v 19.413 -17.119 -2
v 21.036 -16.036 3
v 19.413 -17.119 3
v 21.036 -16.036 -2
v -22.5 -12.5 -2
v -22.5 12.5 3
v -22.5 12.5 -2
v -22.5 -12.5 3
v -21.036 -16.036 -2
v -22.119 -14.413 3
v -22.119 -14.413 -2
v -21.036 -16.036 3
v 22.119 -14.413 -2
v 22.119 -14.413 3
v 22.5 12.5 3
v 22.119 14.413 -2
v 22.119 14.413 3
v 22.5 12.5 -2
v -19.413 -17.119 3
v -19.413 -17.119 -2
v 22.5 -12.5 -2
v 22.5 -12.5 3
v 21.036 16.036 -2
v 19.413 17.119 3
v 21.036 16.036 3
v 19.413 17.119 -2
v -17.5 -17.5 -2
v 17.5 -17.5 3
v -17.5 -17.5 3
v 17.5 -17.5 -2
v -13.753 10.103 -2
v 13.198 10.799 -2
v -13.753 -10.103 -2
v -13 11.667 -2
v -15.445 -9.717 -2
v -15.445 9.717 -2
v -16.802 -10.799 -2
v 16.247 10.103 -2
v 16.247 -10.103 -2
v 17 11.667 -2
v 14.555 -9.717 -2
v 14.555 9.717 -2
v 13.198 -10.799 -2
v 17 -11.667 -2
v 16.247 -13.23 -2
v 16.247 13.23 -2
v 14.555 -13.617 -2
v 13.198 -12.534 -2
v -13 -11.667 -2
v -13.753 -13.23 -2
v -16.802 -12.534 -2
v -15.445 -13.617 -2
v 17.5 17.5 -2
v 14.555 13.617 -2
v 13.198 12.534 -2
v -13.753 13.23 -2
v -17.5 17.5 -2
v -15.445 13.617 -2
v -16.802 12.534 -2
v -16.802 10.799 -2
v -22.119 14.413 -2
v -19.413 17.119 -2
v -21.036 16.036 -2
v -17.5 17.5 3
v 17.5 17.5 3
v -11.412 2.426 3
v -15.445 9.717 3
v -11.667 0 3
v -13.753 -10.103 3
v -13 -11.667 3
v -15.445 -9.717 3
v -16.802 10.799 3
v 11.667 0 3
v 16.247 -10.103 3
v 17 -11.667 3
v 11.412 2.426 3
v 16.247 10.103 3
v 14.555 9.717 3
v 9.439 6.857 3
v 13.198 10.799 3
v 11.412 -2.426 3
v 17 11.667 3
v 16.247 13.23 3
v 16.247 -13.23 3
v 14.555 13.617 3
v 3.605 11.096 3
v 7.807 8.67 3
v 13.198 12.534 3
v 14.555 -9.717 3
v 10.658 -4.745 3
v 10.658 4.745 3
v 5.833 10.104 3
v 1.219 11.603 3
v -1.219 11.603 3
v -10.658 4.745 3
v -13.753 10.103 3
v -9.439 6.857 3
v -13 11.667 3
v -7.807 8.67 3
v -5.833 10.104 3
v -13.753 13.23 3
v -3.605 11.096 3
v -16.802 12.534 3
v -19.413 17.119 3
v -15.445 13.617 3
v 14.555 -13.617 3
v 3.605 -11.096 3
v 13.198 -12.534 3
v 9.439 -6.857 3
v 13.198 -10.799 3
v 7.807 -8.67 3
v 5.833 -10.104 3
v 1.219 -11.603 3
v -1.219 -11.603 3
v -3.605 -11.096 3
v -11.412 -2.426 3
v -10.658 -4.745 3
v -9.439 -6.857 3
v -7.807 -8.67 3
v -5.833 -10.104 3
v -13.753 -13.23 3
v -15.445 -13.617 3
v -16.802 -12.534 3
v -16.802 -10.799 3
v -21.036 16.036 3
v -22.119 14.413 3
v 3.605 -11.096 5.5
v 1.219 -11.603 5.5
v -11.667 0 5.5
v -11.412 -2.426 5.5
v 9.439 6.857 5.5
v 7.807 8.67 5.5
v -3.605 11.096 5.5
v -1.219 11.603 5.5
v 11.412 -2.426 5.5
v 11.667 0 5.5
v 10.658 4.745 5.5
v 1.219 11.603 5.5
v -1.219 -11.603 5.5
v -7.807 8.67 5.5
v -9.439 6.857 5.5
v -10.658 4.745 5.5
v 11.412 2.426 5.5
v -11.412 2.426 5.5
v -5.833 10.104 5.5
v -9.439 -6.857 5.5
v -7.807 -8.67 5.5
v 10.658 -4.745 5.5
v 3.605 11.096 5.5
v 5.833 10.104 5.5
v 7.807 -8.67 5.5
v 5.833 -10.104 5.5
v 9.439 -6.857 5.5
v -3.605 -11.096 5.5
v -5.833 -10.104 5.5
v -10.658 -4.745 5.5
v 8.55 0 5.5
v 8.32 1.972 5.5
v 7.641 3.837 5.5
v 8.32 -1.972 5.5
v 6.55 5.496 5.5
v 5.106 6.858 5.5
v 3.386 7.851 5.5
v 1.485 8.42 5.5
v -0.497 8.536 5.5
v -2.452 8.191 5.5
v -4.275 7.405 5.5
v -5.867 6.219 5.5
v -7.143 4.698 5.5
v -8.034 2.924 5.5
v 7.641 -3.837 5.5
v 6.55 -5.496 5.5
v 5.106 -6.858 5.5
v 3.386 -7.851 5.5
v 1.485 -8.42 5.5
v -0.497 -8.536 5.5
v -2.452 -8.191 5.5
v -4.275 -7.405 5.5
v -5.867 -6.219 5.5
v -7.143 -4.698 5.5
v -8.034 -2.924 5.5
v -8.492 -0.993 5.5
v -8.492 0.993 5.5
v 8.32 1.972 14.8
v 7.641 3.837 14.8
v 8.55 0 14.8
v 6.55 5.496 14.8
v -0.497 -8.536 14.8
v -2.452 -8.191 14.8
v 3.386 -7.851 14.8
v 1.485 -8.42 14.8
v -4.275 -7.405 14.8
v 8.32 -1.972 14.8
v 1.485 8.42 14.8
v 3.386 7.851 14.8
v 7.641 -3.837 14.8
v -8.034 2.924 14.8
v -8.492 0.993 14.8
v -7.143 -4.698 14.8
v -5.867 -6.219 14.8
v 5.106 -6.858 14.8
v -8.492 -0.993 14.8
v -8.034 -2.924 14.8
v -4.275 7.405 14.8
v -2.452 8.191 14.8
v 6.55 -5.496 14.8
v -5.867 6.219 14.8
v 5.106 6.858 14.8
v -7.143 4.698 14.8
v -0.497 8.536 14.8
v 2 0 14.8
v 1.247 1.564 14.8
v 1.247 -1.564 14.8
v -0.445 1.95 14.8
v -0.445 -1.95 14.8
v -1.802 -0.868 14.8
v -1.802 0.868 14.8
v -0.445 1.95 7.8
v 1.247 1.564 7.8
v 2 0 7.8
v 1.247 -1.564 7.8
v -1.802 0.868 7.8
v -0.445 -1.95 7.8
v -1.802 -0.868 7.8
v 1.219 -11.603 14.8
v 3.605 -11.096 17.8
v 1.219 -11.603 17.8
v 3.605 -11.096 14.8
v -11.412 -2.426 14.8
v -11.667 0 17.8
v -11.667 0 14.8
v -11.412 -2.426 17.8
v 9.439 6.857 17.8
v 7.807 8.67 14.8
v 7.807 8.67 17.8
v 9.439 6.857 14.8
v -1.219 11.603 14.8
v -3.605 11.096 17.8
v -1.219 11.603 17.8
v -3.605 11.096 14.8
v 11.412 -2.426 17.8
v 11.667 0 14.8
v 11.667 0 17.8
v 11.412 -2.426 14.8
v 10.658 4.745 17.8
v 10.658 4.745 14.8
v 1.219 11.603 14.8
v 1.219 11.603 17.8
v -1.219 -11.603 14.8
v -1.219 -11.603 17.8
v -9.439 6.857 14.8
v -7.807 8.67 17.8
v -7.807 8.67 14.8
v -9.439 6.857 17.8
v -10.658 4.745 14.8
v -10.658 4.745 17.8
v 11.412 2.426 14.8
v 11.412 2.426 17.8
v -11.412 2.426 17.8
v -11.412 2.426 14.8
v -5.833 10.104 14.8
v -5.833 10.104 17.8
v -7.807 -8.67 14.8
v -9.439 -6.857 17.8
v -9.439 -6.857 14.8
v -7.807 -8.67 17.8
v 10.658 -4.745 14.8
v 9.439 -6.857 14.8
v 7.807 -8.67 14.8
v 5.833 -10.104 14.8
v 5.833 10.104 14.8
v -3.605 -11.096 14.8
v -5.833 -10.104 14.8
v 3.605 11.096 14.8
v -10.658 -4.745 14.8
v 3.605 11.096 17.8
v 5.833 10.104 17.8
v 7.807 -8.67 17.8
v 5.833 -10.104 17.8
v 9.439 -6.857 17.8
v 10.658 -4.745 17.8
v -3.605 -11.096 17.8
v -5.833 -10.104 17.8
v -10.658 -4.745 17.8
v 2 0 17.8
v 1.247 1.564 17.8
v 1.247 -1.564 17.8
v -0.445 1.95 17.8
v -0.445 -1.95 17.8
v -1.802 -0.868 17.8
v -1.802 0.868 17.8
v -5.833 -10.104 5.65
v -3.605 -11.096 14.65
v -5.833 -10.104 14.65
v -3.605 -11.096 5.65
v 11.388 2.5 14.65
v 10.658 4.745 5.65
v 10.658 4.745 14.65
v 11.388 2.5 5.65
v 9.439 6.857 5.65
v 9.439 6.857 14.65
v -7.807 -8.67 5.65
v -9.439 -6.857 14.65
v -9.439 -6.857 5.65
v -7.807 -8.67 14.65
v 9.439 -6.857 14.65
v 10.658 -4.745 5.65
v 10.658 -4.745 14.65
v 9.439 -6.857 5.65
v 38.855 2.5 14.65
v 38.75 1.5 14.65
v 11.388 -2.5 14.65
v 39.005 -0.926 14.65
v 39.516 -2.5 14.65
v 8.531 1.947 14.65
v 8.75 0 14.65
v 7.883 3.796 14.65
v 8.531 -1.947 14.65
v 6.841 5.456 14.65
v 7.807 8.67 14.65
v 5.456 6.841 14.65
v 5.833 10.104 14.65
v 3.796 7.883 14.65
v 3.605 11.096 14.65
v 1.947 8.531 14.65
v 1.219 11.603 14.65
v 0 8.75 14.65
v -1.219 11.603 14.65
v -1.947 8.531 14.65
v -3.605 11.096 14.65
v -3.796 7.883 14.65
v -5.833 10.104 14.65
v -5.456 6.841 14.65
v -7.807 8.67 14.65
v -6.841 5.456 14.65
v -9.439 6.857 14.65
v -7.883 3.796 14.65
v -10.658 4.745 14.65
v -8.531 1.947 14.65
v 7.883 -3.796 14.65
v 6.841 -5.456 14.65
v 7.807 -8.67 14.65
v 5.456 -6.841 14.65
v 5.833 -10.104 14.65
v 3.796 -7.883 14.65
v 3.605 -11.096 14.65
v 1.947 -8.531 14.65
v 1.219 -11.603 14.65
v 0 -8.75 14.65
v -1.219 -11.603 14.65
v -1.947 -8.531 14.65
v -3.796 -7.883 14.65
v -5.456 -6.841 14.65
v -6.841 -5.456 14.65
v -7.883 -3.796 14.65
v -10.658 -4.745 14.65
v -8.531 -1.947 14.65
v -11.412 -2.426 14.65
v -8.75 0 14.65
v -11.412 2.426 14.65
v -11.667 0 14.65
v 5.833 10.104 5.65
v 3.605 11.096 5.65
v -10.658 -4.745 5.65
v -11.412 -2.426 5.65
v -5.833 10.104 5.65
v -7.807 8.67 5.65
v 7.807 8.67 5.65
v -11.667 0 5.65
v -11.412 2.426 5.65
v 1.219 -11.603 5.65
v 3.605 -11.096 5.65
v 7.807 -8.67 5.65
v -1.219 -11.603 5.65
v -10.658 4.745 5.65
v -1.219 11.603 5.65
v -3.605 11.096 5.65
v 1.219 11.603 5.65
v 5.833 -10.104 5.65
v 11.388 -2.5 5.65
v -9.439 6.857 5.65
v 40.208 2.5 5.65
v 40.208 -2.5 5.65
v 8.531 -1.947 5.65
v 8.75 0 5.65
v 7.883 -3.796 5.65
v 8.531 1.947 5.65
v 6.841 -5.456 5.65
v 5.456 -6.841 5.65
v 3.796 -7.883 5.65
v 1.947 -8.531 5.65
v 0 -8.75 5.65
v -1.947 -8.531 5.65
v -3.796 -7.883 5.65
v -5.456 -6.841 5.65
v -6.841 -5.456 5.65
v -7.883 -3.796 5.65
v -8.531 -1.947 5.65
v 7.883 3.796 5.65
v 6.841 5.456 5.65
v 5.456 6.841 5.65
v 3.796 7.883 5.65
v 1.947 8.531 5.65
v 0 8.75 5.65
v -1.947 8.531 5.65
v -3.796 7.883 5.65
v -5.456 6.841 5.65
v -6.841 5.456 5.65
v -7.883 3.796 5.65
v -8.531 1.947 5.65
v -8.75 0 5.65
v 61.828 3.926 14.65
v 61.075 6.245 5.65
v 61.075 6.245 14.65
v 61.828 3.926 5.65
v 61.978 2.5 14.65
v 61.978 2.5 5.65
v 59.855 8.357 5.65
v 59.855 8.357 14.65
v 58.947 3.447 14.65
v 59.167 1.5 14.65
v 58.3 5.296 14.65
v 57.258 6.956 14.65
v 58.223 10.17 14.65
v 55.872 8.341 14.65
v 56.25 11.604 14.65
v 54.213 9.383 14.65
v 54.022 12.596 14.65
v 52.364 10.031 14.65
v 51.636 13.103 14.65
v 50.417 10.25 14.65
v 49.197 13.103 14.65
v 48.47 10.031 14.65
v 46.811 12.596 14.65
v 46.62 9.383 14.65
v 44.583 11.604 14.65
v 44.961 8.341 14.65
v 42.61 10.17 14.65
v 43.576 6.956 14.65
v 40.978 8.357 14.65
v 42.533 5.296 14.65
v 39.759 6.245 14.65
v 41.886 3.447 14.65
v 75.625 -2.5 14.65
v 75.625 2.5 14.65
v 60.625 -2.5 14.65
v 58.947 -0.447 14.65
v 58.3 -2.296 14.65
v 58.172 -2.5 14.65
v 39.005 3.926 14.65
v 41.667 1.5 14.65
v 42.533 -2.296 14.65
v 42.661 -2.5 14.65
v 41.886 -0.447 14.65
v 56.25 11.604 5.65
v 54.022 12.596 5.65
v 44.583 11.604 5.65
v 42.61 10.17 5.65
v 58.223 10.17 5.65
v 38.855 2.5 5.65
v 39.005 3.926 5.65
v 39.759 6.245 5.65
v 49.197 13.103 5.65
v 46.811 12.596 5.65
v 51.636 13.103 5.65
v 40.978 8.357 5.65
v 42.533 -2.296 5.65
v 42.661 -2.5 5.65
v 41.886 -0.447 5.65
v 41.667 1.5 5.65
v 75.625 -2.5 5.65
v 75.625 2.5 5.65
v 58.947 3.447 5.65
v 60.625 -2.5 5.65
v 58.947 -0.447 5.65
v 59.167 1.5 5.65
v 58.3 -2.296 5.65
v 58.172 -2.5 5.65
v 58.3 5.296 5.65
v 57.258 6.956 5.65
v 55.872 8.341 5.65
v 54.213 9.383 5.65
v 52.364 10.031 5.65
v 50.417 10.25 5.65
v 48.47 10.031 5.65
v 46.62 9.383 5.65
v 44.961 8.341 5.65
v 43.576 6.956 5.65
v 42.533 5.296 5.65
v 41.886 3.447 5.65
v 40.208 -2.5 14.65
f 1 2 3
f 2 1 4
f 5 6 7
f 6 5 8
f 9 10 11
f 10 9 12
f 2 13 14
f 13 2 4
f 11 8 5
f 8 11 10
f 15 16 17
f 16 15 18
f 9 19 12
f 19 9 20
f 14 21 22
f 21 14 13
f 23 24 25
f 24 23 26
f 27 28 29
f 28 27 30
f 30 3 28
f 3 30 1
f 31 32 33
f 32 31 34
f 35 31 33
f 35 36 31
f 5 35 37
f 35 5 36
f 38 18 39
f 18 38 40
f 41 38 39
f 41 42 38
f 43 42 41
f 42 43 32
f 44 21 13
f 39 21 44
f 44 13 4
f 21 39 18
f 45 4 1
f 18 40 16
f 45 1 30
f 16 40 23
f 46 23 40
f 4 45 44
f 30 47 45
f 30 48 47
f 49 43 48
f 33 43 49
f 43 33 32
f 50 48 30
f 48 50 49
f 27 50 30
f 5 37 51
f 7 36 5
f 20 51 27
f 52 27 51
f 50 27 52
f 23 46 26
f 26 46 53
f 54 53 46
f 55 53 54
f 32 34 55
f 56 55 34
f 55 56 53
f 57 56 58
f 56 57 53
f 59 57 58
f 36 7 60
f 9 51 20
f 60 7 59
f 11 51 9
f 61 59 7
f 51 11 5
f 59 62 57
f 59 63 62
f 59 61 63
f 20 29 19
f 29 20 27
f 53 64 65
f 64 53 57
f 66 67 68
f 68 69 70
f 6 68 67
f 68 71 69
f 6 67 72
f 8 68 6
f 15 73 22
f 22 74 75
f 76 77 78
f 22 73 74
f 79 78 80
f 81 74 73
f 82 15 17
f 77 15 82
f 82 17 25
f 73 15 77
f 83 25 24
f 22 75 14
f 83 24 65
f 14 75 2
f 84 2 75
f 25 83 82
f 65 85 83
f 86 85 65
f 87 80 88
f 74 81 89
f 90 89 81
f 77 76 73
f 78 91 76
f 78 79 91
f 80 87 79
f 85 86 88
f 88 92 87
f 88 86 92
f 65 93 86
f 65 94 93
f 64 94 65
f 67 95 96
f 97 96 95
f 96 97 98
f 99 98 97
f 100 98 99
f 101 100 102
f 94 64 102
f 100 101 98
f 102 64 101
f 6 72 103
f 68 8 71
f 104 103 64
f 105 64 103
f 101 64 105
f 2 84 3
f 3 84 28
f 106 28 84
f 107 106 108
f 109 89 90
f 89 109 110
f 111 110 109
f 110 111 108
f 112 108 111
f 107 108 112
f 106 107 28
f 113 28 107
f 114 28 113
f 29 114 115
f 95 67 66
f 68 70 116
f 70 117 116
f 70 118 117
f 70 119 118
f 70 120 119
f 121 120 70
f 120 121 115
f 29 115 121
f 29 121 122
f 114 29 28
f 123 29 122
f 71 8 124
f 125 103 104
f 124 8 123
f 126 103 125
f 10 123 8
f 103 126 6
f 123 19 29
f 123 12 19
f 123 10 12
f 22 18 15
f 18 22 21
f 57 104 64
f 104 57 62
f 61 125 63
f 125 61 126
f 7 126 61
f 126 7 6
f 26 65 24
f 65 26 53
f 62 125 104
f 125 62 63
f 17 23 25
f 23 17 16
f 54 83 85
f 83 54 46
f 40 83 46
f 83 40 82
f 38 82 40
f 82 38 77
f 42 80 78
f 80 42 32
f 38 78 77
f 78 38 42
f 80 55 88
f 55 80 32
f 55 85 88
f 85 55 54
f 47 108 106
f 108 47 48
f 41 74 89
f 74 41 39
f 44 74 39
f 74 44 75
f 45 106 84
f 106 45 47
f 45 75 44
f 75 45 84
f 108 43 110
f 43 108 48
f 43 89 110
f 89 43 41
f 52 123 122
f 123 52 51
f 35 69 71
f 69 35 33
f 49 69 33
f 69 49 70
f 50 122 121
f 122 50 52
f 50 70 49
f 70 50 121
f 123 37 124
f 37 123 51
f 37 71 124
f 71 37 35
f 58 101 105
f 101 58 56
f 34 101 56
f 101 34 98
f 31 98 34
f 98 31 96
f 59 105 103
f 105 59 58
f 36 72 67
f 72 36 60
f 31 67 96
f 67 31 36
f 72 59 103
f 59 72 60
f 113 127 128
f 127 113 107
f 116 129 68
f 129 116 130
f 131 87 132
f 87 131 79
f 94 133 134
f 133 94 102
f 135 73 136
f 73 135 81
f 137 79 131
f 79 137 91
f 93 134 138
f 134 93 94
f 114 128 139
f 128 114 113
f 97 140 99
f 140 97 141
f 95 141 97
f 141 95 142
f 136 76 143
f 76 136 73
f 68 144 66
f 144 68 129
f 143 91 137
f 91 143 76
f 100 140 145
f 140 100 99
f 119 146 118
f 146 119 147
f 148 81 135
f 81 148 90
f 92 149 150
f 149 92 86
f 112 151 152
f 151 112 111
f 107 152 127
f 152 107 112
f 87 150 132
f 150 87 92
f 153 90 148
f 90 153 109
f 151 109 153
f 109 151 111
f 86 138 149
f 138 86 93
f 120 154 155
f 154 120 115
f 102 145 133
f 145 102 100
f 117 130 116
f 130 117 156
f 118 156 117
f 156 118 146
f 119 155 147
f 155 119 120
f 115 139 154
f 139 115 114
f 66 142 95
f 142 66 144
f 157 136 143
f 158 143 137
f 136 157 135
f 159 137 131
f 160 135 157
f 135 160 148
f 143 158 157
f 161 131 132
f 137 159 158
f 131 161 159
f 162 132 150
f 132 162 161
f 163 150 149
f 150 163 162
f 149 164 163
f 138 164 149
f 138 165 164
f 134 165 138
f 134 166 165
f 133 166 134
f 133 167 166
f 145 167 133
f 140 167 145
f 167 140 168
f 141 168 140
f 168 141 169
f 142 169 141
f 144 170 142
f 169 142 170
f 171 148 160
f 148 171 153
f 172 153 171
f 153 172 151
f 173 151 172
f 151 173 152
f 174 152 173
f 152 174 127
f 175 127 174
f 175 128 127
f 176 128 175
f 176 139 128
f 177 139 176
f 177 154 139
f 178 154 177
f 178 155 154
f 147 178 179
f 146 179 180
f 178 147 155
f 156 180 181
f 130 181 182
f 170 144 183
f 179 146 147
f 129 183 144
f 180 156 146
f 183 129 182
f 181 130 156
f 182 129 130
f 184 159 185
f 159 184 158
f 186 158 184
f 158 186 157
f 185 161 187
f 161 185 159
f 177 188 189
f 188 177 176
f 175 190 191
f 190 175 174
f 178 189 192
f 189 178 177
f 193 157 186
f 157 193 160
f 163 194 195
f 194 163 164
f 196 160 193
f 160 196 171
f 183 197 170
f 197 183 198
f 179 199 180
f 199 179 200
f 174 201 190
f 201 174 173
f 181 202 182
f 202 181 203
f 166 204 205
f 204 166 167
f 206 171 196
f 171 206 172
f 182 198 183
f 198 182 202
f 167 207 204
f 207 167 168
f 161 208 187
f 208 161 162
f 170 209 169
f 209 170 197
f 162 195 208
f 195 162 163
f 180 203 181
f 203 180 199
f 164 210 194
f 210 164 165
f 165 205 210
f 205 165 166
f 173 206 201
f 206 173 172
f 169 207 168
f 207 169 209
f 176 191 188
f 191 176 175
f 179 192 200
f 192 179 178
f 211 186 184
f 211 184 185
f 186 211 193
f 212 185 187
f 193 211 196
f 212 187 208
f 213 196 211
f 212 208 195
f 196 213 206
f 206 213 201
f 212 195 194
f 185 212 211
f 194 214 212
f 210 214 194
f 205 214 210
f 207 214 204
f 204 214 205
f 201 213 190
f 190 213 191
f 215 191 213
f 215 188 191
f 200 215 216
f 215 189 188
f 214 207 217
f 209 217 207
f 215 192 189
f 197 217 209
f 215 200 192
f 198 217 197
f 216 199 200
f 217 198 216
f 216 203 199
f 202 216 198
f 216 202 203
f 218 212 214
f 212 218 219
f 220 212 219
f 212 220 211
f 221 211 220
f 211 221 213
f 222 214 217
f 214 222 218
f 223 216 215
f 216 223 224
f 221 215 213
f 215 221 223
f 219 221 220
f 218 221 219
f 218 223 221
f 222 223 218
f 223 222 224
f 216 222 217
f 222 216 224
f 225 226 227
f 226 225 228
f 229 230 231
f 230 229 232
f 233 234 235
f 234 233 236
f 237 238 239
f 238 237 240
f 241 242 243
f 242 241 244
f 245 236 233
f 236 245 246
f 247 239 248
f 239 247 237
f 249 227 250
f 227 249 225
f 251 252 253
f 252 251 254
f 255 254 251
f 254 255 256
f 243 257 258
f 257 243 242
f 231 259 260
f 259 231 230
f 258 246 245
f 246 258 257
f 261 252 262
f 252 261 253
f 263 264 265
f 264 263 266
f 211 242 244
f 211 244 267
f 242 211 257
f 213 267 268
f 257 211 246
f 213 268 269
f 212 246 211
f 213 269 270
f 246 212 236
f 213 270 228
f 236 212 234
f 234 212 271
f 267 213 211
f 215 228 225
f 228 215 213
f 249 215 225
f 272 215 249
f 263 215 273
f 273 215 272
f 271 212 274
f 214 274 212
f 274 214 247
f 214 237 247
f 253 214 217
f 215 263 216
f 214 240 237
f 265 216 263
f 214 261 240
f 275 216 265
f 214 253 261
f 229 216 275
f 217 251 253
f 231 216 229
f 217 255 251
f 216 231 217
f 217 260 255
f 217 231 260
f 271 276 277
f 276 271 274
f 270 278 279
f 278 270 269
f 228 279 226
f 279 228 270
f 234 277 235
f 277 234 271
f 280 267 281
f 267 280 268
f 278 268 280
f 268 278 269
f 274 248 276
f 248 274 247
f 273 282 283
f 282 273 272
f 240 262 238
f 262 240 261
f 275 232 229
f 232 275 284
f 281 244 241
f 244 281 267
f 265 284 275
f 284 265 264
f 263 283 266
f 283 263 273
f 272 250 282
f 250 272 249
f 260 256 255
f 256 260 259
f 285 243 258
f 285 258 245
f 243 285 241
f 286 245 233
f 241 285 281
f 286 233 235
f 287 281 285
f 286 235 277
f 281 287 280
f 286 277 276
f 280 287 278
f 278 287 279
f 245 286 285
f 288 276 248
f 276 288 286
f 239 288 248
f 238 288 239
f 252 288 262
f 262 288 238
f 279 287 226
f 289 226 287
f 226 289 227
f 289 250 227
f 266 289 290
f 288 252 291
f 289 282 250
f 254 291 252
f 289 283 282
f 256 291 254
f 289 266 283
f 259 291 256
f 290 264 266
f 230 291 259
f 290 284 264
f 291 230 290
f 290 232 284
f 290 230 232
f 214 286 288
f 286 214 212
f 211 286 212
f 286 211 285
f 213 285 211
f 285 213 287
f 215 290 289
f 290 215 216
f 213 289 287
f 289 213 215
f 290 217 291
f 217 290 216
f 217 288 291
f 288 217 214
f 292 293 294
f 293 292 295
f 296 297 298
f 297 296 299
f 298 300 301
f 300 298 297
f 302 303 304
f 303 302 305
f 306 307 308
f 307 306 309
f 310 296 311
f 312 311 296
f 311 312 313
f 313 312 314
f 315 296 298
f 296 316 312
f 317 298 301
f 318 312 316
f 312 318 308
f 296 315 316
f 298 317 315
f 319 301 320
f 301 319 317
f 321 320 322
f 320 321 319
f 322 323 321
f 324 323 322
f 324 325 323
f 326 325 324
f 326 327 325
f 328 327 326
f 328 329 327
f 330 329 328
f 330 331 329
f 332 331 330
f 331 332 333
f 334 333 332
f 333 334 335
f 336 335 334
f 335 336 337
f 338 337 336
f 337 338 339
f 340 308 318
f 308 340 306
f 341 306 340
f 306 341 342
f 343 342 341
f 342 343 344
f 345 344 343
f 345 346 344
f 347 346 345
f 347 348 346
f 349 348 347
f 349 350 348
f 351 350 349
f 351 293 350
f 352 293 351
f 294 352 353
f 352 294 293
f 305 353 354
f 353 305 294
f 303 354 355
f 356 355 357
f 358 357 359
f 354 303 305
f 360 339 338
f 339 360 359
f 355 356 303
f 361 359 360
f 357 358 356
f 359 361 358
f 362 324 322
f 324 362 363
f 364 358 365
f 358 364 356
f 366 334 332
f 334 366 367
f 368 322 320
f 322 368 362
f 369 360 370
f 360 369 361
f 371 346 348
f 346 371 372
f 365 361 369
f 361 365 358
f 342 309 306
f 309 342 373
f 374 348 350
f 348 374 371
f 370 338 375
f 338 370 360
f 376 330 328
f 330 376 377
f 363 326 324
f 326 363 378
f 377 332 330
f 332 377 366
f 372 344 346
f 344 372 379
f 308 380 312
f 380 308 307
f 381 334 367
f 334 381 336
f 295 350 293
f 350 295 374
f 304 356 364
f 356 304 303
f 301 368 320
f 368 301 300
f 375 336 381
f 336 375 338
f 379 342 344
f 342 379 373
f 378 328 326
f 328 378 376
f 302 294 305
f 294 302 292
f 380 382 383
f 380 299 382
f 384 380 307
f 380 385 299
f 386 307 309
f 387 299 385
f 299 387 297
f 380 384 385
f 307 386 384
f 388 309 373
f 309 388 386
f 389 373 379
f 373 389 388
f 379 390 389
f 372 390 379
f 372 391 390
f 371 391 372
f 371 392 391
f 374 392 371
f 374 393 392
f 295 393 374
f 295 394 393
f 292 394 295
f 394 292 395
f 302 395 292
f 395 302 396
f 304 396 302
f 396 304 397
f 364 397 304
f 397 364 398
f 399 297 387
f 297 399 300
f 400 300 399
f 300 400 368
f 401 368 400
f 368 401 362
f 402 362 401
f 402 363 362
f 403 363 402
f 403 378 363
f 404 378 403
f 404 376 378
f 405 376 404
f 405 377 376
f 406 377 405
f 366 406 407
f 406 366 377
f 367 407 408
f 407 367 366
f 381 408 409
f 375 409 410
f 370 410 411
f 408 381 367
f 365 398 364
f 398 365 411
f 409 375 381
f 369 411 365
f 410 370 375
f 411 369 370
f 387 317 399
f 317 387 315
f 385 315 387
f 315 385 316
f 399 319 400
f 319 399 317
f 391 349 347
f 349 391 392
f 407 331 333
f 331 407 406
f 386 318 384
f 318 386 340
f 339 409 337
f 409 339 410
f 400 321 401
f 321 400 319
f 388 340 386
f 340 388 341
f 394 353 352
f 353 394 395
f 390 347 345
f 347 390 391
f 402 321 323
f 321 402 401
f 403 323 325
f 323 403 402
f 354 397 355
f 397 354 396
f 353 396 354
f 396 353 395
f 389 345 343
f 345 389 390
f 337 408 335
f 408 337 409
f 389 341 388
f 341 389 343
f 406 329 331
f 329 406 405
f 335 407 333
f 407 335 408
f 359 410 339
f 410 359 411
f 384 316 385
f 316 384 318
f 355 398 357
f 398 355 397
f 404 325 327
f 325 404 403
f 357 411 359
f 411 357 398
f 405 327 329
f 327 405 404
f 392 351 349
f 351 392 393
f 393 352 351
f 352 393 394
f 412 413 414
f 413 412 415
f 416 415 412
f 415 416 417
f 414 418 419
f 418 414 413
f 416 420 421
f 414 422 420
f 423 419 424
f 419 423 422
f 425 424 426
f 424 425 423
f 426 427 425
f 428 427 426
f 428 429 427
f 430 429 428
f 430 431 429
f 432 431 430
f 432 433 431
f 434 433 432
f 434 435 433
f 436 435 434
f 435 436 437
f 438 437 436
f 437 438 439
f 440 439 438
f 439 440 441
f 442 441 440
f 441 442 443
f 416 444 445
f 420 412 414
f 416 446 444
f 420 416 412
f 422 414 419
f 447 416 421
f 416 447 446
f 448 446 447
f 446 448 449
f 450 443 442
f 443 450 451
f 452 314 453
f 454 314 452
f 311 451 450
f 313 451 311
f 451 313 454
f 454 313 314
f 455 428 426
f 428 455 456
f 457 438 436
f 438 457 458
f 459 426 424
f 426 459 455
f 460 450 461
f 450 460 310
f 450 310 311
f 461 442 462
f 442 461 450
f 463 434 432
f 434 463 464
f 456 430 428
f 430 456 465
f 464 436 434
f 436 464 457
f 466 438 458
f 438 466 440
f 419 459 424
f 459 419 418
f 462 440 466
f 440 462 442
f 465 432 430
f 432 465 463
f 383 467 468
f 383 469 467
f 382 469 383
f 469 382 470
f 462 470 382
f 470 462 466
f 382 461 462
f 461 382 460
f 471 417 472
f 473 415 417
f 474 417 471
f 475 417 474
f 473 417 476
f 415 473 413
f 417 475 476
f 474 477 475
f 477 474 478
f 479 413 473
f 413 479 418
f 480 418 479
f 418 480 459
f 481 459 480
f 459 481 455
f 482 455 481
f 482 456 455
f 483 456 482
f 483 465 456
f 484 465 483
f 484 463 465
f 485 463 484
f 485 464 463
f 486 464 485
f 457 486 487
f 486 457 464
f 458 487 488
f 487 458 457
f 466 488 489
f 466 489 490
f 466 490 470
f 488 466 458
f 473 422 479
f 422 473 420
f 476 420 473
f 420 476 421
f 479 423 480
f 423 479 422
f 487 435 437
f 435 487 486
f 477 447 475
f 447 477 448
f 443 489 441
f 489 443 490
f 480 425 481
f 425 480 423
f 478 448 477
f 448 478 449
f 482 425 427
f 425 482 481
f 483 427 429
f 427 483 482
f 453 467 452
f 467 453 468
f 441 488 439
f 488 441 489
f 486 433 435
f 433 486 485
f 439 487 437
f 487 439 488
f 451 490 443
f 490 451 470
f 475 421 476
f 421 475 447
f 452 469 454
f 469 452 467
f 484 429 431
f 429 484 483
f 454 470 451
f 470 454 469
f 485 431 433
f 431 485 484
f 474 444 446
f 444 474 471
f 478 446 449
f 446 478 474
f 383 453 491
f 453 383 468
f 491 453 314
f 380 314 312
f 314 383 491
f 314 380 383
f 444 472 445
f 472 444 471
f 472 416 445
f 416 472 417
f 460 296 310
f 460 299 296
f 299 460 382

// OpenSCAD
// Which one would you like to see?
part = "all"; // [first:Base Only,second:Top Only,third:Hook only,all:All]

/* [Base Settings] */
BaseHeight=5;
BaseLength=45;
BaseWidth=35;
//This one applies also to the hole to set the top on to the base.
MountingHoles=4;
/* [Pillar Settings] */
CylHeight=15;
Spacing=.3;
/* [Hook Settings] */
HookLength=30;
TabLength=15;
/* [Hidden] */
TabWidth=5;
print_part();

module print_part(){
    if(part=="first"){
        Base(BaseHeight,BaseLength,BaseWidth,MountingHoles,CylHeight);
    }
    else if(part=="second"){
        translate([0,0,BaseHeight/2+Spacing+CylHeight-CylHeight/5]) Top(BaseHeight,MountingHoles);
    }
    else if(part=="third"){
        translate([0,0,CylHeight/5]) Hook(HookLength,BaseHeight,BaseWidth,TabLength,CylHeight,Spacing);
    }
    else if(part=="all"){
        Base(BaseHeight,BaseLength,BaseWidth,MountingHoles,CylHeight);
translate([0,0,BaseHeight/2+Spacing+CylHeight-CylHeight/5]) Top(BaseHeight,MountingHoles);
translate([0,0,CylHeight/5]) Hook(HookLength,BaseHeight,BaseWidth,TabLength,CylHeight,Spacing);
    }
}

module Base(BaseHeight,BaseLength,BaseWidth,MountingHole,CylHeight){
    union(){difference(){
        minkowski(){
            cube([BaseLength-10,BaseWidth-10,BaseHeight-1],center=true);
            cylinder(r=5,h=1);
        }
        translate([BaseLength/3,BaseWidth/3,-BaseHeight/2+0.5]) cylinder(h=BaseHeight,r=MountingHoles/2);
        translate([BaseLength/3,-BaseWidth/3,-BaseHeight/2+0.5]) cylinder(h=BaseHeight,r=MountingHoles/2);
        translate([-BaseLength/3,-BaseWidth/3,-BaseHeight/2+0.5]) cylinder(h=BaseHeight,r=MountingHoles/2);
        translate([-BaseLength/3,BaseWidth/3,-BaseHeight/2+0.5]) cylinder(h=BaseHeight,r=MountingHoles/2);
    }
    difference(){
        union(){
            if(BaseLength<BaseWidth){
                translate([0,0,BaseHeight/2]) cylinder(r=BaseLength/3,h=(CylHeight/5));
                translate([0,0,BaseHeight/2+CylHeight/5]) cylinder(r=BaseLength/4-0.2,h=(CylHeight+Spacing)-((CylHeight/5)*2));
            }
            else{
                translate([0,0,BaseHeight/2]) cylinder(r=BaseWidth/3,h=(CylHeight/5));
                translate([0,0,BaseHeight/2+CylHeight/5]) cylinder(r=BaseWidth/4-0.2,h=(CylHeight+Spacing)-((CylHeight/5)*2));
            }
            
        }
            translate([0,0,(BaseHeight/2)+CylHeight-(CylHeight/1.5)+Spacing]) cylinder(r=MountingHoles/2,h=CylHeight/1.5);
        }
    }
}

module Top(BaseHeight,MountingHoles){
    if(BaseLength<BaseWidth){
                difference(){
                cylinder(r=BaseLength/3,h=CylHeight/5);
        cylinder(r=MountingHoles/2,h=CylHeight/5);
            }
        }
            else{
                difference(){
                cylinder(r=BaseWidth/3,h=CylHeight/5);
        cylinder(r=MountingHoles/2,h=CylHeight/5);
            }
    }
}

module Hook(HookLength,BaseHeight,BaseWidth,TabLength,CylHeight,Spacing){      
            if(BaseLength<BaseWidth){
                difference(){
                translate([0,0,BaseHeight/2+Spacing/2]) cylinder(r=BaseLength/3,h=(CylHeight)-(2*(CylHeight/5)));
                 translate([0,0,BaseHeight/2+Spacing/2]) cylinder(r=BaseLength/4,h=(CylHeight-(2*(CylHeight/5))));   
                }
            }
            else{
                difference(){
                translate([0,0,BaseHeight/2+Spacing/2]) cylinder(r=BaseWidth/3,h=(CylHeight-(2*(CylHeight/5))));
                    translate([0,0,BaseHeight/2+Spacing/2]) cylinder(r=BaseWidth/4,h=(CylHeight-(2*(CylHeight/5))));}
            }
        if(BaseLength<BaseWidth){
                translate([BaseLength/3-BaseLength/24,-TabWidth/2,BaseHeight/2+Spacing/2]) cube([HookLength,TabWidth,CylHeight-(2*(CylHeight/5))]);
            }
            else{
                translate([BaseWidth/3-BaseWidth/24,-TabWidth/2,BaseHeight/2+Spacing/2]) cube([HookLength,TabWidth,CylHeight-(2*(CylHeight/5))]);
            }
            if(BaseLength<BaseWidth){
                union(){
                translate([HookLength-BaseLength/12+BaseLength/1.5,1.5,BaseHeight/2+Spacing/2]){difference(){
                cylinder(r=BaseLength/3,h=(CylHeight)-(2*(CylHeight/5)));
                cylinder(r=BaseLength/4,h=(CylHeight-(2*(CylHeight/5))));
                translate([-BaseLength/3,-BaseLength/3-4,0]) cube([BaseLength/1.5,BaseLength/3,CylHeight-(2*(CylHeight/5))]);
                }
                translate([BaseLength/3-BaseLength/24,-4,0]) cube([TabLength,TabWidth,(CylHeight-(2*(CylHeight/5)))]);
            }
            }
            }
            else{
                union(){
                translate([HookLength-BaseWidth/12+BaseWidth/1.5,1.5,BaseHeight/2+Spacing/2]){difference(){
                cylinder(r=BaseWidth/3,h=(CylHeight)-(2*(CylHeight/5)));
                cylinder(r=BaseWidth/4,h=(CylHeight-(2*(CylHeight/5))));
                translate([-BaseWidth/3,-BaseWidth/3-4,0]) cube([BaseWidth/1.5,BaseWidth/3,CylHeight-(2*(CylHeight/5))]);
                }
                translate([BaseWidth/3-BaseWidth/24,-4,0]) cube([TabLength,TabWidth,(CylHeight-(2*(CylHeight/5)))]);
            }
            }
            }
}

/*Base(BaseHeight,BaseLength,BaseWidth,MountingHoles,CylHeight);
translate([0,0,BaseHeight/2+Spacing+CylHeight-CylHeight/5]) Top(BaseHeight,MountingHoles);
translate([0,0,CylHeight/5]) Hook(HookLength,BaseHeight,BaseWidth,TabLength,CylHeight,Spacing);
*/
